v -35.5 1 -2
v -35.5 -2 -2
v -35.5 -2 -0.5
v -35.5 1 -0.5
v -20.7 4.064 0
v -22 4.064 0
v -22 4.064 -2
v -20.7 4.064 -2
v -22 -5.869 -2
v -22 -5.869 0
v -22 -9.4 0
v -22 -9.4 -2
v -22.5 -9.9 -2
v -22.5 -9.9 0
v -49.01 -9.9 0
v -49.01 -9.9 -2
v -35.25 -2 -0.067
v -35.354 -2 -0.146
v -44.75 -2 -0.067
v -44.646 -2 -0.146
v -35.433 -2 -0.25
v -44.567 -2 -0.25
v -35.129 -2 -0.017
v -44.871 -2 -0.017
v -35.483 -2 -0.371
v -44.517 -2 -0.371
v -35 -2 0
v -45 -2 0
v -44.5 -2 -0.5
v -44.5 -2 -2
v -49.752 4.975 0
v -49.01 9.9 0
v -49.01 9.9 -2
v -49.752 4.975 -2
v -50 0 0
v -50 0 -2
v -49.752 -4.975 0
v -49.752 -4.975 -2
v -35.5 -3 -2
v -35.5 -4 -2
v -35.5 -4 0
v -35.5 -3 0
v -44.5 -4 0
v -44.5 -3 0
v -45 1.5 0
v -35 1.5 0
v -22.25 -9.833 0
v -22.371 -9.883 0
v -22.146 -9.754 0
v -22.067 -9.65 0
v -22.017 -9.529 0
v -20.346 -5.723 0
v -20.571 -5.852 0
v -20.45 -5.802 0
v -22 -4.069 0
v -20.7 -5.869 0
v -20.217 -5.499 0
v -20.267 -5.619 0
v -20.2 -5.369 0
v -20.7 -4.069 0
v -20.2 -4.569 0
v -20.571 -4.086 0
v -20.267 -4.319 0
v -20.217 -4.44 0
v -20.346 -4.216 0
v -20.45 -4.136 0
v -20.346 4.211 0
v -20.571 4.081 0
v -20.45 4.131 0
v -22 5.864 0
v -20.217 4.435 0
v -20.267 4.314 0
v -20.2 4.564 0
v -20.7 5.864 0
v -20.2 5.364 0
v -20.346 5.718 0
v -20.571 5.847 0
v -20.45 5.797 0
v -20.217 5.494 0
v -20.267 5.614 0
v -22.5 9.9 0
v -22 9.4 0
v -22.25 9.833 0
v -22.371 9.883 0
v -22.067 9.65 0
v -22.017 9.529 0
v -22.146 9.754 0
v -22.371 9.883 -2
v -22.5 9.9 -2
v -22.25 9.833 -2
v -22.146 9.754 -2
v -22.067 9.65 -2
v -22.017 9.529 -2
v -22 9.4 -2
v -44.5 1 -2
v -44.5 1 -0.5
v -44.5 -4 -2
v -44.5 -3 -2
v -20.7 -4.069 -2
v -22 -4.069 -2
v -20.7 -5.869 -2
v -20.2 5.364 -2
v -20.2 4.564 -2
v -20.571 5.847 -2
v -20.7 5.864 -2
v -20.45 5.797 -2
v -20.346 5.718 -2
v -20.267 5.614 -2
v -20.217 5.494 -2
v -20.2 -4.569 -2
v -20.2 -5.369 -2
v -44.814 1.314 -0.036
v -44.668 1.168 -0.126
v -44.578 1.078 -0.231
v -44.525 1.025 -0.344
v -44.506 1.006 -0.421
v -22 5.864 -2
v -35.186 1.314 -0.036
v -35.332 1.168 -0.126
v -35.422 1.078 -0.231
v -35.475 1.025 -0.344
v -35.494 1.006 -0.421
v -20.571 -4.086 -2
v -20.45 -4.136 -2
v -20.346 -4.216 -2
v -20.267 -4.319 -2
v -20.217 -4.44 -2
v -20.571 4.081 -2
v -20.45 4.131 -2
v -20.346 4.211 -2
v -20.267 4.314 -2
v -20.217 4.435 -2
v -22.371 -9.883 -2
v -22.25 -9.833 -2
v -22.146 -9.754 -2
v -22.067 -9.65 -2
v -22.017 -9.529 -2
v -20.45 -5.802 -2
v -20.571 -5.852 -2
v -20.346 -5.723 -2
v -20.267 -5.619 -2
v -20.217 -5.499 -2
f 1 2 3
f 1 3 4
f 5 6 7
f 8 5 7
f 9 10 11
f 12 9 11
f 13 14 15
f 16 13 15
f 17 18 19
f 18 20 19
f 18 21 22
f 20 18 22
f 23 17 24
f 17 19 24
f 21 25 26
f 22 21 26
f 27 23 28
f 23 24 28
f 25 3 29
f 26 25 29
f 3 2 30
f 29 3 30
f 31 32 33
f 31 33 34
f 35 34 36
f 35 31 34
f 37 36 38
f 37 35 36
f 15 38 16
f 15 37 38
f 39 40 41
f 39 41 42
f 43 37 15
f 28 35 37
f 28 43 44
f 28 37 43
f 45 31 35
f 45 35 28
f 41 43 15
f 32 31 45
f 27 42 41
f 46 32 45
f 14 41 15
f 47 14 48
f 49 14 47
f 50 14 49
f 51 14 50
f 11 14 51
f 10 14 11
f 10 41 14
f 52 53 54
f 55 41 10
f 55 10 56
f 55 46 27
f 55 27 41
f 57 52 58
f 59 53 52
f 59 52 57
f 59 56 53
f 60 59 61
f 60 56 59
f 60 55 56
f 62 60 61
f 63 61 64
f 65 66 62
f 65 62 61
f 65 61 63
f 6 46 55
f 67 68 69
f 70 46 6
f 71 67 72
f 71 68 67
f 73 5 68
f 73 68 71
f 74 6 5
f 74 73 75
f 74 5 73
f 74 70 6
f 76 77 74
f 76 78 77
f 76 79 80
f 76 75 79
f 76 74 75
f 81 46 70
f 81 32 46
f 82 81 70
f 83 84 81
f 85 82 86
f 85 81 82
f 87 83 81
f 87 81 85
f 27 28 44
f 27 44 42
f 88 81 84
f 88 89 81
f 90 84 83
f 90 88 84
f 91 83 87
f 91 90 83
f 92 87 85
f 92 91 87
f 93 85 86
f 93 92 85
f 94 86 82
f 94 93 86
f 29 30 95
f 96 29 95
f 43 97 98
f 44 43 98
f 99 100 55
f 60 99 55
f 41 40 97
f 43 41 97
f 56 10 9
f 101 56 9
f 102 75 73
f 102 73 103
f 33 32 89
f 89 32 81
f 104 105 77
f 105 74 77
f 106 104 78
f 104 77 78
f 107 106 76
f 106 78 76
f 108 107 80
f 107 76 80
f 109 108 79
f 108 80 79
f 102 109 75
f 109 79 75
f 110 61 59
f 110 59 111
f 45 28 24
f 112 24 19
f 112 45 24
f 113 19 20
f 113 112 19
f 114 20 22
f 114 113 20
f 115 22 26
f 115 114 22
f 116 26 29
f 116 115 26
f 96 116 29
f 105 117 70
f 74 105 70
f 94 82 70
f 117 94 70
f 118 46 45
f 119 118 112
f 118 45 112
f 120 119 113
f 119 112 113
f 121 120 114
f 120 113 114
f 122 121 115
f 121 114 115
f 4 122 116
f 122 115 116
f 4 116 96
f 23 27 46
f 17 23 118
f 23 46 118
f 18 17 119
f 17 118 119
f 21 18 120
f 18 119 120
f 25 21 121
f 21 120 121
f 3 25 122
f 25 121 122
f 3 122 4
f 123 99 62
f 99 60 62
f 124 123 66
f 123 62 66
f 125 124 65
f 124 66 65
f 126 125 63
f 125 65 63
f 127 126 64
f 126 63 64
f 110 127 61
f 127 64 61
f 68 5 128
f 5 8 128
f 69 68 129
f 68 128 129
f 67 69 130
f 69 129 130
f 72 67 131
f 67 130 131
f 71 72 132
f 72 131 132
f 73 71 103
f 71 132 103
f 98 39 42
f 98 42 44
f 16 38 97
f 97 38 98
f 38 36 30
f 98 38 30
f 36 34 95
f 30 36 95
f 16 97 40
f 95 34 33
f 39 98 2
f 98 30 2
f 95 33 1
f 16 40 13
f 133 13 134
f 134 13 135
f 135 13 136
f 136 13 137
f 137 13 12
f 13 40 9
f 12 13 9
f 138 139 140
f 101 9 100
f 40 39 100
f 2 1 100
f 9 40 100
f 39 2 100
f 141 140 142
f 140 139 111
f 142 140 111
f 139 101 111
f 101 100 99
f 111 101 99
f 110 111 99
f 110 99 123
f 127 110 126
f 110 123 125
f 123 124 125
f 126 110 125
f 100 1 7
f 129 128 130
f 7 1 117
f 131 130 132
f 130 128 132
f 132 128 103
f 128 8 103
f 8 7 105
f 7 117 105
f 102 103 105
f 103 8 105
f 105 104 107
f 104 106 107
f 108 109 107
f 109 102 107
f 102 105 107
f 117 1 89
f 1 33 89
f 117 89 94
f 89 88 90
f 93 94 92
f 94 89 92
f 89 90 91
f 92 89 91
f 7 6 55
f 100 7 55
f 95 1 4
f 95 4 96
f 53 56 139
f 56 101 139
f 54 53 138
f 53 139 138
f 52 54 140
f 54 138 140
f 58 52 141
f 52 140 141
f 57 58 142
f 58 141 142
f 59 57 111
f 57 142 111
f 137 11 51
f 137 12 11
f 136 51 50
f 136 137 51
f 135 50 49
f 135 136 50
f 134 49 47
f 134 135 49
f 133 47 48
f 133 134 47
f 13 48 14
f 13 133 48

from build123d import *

# Parameters (mm, degrees)
SKETCH1_R           = 50
BOSS_EXTRUDE1_DEPTH = 2
SKETCH1_3_W         = 9
SKETCH1_3_H         = 4
BOSS_EXTRUDE2_DEPTH = 5
CUT_EXTRUDE1_DEPTH  = 9
SKETCH5_W           = 24
SKETCH5_H           = 2
BOSS_EXTRUDE3_DEPTH = 2.5
CUT_EXTRUDE7_DEPTH  = 2
SKETCH8_W           = 33
SKETCH8_H           = 2
BOSS_EXTRUDE4_DEPTH = 2.5
SKETCH13_W          = 24
SKETCH13_H          = 2.5
CUT_EXTRUDE10_DEPTH = 4
SKETCH1_9_R         = 10
CUT_EXTRUDE17_DEPTH = 2
CHAMFER2_SIZE       = 4.5
CHAMFER2_SIZE_2     = 3.150933922
CUT_EXTRUDE19_DEPTH = 9
SKETCH15_W          = 9
SKETCH15_H          = 3
SKETCH15_H_2        = 1
CUT_EXTRUDE20_DEPTH = 2
BOSS_EXTRUDE6_DEPTH = 1.8
FILLET4_R           = 0.5


with BuildPart() as part:
    # Sketch1 → Boss-Extrude1 (new body)
    with BuildSketch(Plane.XY):
        Circle(SKETCH1_R)
    extrude(amount=-BOSS_EXTRUDE1_DEPTH)

    # Sketch1<3> → Boss-Extrude2 (add)
    with BuildSketch(Plane.XY):
        with Locations((-40, 0)):
            Rectangle(SKETCH1_3_W, SKETCH1_3_H)
    extrude(amount=BOSS_EXTRUDE2_DEPTH)

    # Sketch4 → Cut-Extrude1 (cut)
    with BuildSketch(Plane.ZY.offset(44.5)):
        Polygon((0, 0), (2.5, 0), (2.5, -2), (5, -2), (5, 2), (0, 2), align=None)
        Polygon((0, 0), (0, -2), (2.5, 0), align=None)
    extrude(amount=-CUT_EXTRUDE1_DEPTH, mode=Mode.SUBTRACT)


with BuildPart() as cut_extrude1_piece_1:
    # of the separate pieces the step leaves, piece 1, a body of its own (cut_extrude1_pieces)
    add(part.part.solids().sort_by_distance((50, 0, 0))[0])

    # Sketch5 → Boss-Extrude3 (add)
    with BuildSketch(Plane.XY):
        with Locations((-23.5, -1)):
            Rectangle(SKETCH5_W, SKETCH5_H)
    extrude(amount=BOSS_EXTRUDE3_DEPTH)

    # Sketch1<4> → Cut-Extrude7 (cut)
    with BuildSketch(Plane.XY):
        with BuildLine():
            Line((10, 0), (0, 0))
            Line((0, 0), (-10, 0))
            ThreePointArc((-10, 0), (0, -10), (10, 0))
        make_face()
        with BuildLine():
            Line((-10, 0), (0, 0))
            Line((0, 0), (10, 0))
            ThreePointArc((10, 0), (0, 10), (-10, 0))
        make_face()
        with BuildLine():
            Line((10, 0), (0, 0))
            Line((0, 0), (-10, 0))
            ThreePointArc((-10, 0), (0, -10), (10, 0))
        make_face()
        with BuildLine():
            Line((-10, 0), (0, 0))
            Line((0, 0), (10, 0))
            ThreePointArc((10, 0), (0, 10), (-10, 0))
        make_face()
    extrude(amount=-CUT_EXTRUDE7_DEPTH, mode=Mode.SUBTRACT)



with BuildPart() as cut_extrude1_piece_2:
    # of the separate pieces the step leaves, piece 2, a body of its own (cut_extrude1_pieces)
    add(part.part.solids().sort_by_distance((-44.5, -2, 2.5))[0])


with BuildPart() as cut_extrude1_piece_1_1:
    add(cut_extrude1_piece_1.part)

    add(cut_extrude1_piece_2.part)  # Boss-Extrude4 merges Cut-Extrude1 piece 2
    # Sketch8 → Boss-Extrude4 (add)
    with BuildSketch(Plane.XY):
        with Locations((-28, -3)):
            Rectangle(SKETCH8_W, SKETCH8_H)
    extrude(amount=BOSS_EXTRUDE4_DEPTH)

    # Sketch13 → Cut-Extrude10 (cut)
    with BuildSketch(Plane(origin=(0, 0, 0), x_dir=(1, 0, 0), z_dir=(0, 1, 0))):
        with Locations((-23.5, -1.25)):
            Rectangle(SKETCH13_W, SKETCH13_H)
    extrude(amount=-CUT_EXTRUDE10_DEPTH, mode=Mode.SUBTRACT)

    # Sketch1<9> → Cut-Extrude17 (cut)
    with BuildSketch(Plane.XY):
        with BuildLine():
            Line((-22, 9.9), (-22, -9.9))
            Line((-22, -9.9), (-49.010101, -9.9))
            ThreePointArc((-49.010101, -9.9), (50, 0), (-49.010101, 9.9))
            Line((-49.010101, 9.9), (-22, 9.9))
        make_face()
        Circle(SKETCH1_9_R, mode=Mode.SUBTRACT)
    extrude(amount=-CUT_EXTRUDE17_DEPTH, mode=Mode.SUBTRACT)

    # Chamfer2
    # the kernel refuses this chamfer: 4.5, 3.150933922 mm, written as the material it takes off along each edge
    with BuildSketch(Plane(origin=(-35.5, -9.259884147, -9.074855184), x_dir=(-0.9997533347641299, 0.017342841849466925, -0.013874273479573545), z_dir=(0, 0.6246950475544244, 0.7808688094430303))) as chamfer2_piece_1_section:
        Polygon((CHAMFER2_SIZE * 0.999753334764, CHAMFER2_SIZE * 0.0222096741985), (-CHAMFER2_SIZE_2 * 0.0222096741981, CHAMFER2_SIZE_2 * 0.999753334746), (0, 0), align=None)
    chamfer2_piece_1 = extrude(amount=26.444532191, mode=Mode.PRIVATE)
    chamfer2_piece_1 = split(chamfer2_piece_1, bisect_by=Plane(origin=(-37.088065075, -2.140732647, 0), z_dir=(0, 0, 1)), keep=Keep.TOP, mode=Mode.PRIVATE)
    add(chamfer2_piece_1, mode=Mode.SUBTRACT)

    # Sketch17 → Cut-Extrude19 (cut)
    with BuildSketch(Plane.ZY.offset(44.5)):
        Polygon((0, -4), (2.5, -4), (2.5, 0), (0, -2), align=None)
    extrude(amount=-CUT_EXTRUDE19_DEPTH, mode=Mode.SUBTRACT)

    # Sketch15 → Cut-Extrude20 (cut)
    with BuildSketch(Plane(origin=(0, 0, -2), x_dir=(-1, 0, 0), z_dir=(0, 0, -1))):
        with Locations((40, -0.5)):
            Rectangle(SKETCH15_W, SKETCH15_H)
        with Locations((40, -3.5)):
            Rectangle(SKETCH15_W, SKETCH15_H_2)
    extrude(amount=-CUT_EXTRUDE20_DEPTH, mode=Mode.SUBTRACT)

    # Sketch18 → Boss-Extrude6 (add)
    with BuildSketch(Plane(origin=(-22, 0, 0), x_dir=(0, 0, -1), z_dir=(1, 0, 0))):
        Polygon((0, 4.064201772), (2, 4.064201772), (2, 5.864201772), (1, 5.864201772), (0, 5.864201772), align=None)
        Polygon((2, -5.869107155), (2, -4.069107155), (0, -4.069107155), (0, -5.869107155), (1, -5.869107155), align=None)
    extrude(amount=BOSS_EXTRUDE6_DEPTH)

    # Fillet4
    fillet4_edges = [cut_extrude1_piece_1_1.edges().sort_by_distance(p)[0] for p in [
        (-44.5, -0.5, 0),
        (-35.5, -0.5, 0),
        (-40, 1, 0),
        (-20.2, 5.864201772, -1),
        (-20.2, 4.064201772, -1),
        (-20.2, -4.069107155, -1),
        (-20.2, -5.869107155, -1),
        (-22, -9.9, -1),
        (-22, 9.9, -1),
    ]]
    fillet(fillet4_edges, radius=FILLET4_R)


solid = cut_extrude1_piece_1_1.part
